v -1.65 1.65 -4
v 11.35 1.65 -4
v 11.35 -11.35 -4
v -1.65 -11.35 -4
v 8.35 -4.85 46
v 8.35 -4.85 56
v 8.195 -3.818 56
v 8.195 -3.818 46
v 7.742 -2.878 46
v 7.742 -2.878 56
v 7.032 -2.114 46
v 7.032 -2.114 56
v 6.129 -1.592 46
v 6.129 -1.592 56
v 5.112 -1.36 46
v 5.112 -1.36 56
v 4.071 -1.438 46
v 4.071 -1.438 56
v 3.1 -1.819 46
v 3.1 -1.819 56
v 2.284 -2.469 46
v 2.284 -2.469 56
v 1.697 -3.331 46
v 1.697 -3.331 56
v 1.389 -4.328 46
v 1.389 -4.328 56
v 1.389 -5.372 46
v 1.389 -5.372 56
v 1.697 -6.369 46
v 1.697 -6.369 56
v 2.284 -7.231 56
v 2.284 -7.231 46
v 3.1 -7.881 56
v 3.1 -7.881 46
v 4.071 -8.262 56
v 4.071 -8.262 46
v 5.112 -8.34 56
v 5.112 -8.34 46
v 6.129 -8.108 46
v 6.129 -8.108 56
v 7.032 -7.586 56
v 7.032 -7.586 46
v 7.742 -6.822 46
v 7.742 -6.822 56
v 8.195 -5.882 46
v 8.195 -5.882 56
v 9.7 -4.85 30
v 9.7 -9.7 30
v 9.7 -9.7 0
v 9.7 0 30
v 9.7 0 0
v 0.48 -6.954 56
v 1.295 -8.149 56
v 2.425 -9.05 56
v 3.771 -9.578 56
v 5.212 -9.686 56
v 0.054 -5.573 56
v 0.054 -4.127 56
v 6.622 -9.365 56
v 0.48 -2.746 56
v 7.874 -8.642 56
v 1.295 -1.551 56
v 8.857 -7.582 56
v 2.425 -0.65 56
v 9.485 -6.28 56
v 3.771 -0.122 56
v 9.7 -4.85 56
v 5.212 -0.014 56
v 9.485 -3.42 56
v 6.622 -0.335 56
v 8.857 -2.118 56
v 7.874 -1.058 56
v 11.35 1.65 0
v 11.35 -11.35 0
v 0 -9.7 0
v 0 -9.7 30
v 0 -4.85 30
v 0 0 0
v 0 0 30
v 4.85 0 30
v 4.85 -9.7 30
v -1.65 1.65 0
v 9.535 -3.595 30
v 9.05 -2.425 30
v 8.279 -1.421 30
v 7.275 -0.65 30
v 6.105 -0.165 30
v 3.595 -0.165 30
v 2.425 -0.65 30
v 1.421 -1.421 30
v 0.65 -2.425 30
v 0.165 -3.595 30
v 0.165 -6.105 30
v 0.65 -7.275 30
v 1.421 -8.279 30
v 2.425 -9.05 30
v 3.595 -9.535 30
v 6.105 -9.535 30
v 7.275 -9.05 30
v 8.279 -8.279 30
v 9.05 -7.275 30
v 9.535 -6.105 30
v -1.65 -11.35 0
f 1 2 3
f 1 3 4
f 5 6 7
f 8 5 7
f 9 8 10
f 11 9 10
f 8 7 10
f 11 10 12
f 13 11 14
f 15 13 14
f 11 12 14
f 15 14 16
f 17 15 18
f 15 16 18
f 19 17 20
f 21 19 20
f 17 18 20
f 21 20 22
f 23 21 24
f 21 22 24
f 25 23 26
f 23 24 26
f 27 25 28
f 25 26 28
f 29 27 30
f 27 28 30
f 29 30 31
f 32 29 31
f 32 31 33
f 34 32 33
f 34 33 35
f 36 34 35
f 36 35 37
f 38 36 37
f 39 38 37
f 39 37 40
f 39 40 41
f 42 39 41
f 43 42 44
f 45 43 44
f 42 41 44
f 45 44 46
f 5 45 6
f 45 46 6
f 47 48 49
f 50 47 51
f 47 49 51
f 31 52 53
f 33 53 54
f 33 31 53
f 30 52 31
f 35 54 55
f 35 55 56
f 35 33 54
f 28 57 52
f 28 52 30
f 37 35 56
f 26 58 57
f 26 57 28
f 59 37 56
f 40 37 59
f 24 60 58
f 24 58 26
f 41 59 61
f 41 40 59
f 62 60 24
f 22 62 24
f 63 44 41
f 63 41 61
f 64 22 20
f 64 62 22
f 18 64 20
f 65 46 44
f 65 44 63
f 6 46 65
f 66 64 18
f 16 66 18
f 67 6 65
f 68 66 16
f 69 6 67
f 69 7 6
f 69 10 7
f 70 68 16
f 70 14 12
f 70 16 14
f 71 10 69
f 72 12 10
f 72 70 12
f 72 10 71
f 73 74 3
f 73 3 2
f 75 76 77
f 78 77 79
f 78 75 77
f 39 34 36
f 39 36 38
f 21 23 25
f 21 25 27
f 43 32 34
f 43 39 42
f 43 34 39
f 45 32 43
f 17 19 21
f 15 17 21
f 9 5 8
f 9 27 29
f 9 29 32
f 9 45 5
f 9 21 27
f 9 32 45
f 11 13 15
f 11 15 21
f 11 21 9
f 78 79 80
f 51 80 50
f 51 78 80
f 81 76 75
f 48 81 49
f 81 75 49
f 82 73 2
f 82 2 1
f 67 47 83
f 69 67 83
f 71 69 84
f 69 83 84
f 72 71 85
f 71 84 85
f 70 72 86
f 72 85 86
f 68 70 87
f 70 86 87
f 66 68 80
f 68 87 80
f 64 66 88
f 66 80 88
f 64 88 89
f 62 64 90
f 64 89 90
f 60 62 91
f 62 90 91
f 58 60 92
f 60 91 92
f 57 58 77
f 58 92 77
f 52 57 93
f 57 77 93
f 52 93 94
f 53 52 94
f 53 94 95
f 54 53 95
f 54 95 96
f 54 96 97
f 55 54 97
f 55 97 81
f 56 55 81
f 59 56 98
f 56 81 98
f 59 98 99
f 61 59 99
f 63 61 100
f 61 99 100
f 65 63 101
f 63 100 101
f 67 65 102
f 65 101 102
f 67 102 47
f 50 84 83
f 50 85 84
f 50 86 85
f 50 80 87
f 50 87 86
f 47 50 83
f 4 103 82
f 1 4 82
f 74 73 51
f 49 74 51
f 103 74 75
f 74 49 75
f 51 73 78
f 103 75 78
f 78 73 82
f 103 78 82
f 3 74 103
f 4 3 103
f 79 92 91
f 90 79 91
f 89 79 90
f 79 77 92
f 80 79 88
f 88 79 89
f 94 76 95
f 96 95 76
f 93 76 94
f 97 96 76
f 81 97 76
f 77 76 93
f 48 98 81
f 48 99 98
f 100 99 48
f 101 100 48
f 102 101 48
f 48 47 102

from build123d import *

# Parameters (mm, degrees)
SKETCH1_W           = 9.7
SKETCH1_H           = 9.7
BOSS_EXTRUDE1_DEPTH = 30
SKETCH2_R           = 4.85
BOSS_EXTRUDE2_DEPTH = 26
SKETCH3_W           = 13
SKETCH3_H           = 13
BOSS_EXTRUDE3_DEPTH = 4
SKETCH4_R           = 3.5
CUT_EXTRUDE1_DEPTH  = 10


with BuildPart() as part:
    # Sketch1 → Boss-Extrude1 (new body)
    with BuildSketch(Plane.XY):
        with Locations((4.85, -4.85)):
            Rectangle(SKETCH1_W, SKETCH1_H)
    extrude(amount=BOSS_EXTRUDE1_DEPTH)

    # Sketch2 → Boss-Extrude2 (add)
    with BuildSketch(Plane.XY.offset(30)):
        with Locations((4.85, -4.85)):
            Circle(SKETCH2_R)
    extrude(amount=BOSS_EXTRUDE2_DEPTH)

    # Sketch3 → Boss-Extrude3 (add)
    with BuildSketch(Plane(origin=(0, 0, 0), x_dir=(-1, 0, 0), z_dir=(0, 0, -1))):
        with Locations((-4.85, -4.85)):
            Rectangle(SKETCH3_W, SKETCH3_H)
    extrude(amount=BOSS_EXTRUDE3_DEPTH)

    # Sketch4 → Cut-Extrude1 (cut)
    with BuildSketch(Plane.XY.offset(56)):
        with Locations((4.85, -4.85)):
            Circle(SKETCH4_R)
    extrude(amount=-CUT_EXTRUDE1_DEPTH, mode=Mode.SUBTRACT)


solid = part.part
